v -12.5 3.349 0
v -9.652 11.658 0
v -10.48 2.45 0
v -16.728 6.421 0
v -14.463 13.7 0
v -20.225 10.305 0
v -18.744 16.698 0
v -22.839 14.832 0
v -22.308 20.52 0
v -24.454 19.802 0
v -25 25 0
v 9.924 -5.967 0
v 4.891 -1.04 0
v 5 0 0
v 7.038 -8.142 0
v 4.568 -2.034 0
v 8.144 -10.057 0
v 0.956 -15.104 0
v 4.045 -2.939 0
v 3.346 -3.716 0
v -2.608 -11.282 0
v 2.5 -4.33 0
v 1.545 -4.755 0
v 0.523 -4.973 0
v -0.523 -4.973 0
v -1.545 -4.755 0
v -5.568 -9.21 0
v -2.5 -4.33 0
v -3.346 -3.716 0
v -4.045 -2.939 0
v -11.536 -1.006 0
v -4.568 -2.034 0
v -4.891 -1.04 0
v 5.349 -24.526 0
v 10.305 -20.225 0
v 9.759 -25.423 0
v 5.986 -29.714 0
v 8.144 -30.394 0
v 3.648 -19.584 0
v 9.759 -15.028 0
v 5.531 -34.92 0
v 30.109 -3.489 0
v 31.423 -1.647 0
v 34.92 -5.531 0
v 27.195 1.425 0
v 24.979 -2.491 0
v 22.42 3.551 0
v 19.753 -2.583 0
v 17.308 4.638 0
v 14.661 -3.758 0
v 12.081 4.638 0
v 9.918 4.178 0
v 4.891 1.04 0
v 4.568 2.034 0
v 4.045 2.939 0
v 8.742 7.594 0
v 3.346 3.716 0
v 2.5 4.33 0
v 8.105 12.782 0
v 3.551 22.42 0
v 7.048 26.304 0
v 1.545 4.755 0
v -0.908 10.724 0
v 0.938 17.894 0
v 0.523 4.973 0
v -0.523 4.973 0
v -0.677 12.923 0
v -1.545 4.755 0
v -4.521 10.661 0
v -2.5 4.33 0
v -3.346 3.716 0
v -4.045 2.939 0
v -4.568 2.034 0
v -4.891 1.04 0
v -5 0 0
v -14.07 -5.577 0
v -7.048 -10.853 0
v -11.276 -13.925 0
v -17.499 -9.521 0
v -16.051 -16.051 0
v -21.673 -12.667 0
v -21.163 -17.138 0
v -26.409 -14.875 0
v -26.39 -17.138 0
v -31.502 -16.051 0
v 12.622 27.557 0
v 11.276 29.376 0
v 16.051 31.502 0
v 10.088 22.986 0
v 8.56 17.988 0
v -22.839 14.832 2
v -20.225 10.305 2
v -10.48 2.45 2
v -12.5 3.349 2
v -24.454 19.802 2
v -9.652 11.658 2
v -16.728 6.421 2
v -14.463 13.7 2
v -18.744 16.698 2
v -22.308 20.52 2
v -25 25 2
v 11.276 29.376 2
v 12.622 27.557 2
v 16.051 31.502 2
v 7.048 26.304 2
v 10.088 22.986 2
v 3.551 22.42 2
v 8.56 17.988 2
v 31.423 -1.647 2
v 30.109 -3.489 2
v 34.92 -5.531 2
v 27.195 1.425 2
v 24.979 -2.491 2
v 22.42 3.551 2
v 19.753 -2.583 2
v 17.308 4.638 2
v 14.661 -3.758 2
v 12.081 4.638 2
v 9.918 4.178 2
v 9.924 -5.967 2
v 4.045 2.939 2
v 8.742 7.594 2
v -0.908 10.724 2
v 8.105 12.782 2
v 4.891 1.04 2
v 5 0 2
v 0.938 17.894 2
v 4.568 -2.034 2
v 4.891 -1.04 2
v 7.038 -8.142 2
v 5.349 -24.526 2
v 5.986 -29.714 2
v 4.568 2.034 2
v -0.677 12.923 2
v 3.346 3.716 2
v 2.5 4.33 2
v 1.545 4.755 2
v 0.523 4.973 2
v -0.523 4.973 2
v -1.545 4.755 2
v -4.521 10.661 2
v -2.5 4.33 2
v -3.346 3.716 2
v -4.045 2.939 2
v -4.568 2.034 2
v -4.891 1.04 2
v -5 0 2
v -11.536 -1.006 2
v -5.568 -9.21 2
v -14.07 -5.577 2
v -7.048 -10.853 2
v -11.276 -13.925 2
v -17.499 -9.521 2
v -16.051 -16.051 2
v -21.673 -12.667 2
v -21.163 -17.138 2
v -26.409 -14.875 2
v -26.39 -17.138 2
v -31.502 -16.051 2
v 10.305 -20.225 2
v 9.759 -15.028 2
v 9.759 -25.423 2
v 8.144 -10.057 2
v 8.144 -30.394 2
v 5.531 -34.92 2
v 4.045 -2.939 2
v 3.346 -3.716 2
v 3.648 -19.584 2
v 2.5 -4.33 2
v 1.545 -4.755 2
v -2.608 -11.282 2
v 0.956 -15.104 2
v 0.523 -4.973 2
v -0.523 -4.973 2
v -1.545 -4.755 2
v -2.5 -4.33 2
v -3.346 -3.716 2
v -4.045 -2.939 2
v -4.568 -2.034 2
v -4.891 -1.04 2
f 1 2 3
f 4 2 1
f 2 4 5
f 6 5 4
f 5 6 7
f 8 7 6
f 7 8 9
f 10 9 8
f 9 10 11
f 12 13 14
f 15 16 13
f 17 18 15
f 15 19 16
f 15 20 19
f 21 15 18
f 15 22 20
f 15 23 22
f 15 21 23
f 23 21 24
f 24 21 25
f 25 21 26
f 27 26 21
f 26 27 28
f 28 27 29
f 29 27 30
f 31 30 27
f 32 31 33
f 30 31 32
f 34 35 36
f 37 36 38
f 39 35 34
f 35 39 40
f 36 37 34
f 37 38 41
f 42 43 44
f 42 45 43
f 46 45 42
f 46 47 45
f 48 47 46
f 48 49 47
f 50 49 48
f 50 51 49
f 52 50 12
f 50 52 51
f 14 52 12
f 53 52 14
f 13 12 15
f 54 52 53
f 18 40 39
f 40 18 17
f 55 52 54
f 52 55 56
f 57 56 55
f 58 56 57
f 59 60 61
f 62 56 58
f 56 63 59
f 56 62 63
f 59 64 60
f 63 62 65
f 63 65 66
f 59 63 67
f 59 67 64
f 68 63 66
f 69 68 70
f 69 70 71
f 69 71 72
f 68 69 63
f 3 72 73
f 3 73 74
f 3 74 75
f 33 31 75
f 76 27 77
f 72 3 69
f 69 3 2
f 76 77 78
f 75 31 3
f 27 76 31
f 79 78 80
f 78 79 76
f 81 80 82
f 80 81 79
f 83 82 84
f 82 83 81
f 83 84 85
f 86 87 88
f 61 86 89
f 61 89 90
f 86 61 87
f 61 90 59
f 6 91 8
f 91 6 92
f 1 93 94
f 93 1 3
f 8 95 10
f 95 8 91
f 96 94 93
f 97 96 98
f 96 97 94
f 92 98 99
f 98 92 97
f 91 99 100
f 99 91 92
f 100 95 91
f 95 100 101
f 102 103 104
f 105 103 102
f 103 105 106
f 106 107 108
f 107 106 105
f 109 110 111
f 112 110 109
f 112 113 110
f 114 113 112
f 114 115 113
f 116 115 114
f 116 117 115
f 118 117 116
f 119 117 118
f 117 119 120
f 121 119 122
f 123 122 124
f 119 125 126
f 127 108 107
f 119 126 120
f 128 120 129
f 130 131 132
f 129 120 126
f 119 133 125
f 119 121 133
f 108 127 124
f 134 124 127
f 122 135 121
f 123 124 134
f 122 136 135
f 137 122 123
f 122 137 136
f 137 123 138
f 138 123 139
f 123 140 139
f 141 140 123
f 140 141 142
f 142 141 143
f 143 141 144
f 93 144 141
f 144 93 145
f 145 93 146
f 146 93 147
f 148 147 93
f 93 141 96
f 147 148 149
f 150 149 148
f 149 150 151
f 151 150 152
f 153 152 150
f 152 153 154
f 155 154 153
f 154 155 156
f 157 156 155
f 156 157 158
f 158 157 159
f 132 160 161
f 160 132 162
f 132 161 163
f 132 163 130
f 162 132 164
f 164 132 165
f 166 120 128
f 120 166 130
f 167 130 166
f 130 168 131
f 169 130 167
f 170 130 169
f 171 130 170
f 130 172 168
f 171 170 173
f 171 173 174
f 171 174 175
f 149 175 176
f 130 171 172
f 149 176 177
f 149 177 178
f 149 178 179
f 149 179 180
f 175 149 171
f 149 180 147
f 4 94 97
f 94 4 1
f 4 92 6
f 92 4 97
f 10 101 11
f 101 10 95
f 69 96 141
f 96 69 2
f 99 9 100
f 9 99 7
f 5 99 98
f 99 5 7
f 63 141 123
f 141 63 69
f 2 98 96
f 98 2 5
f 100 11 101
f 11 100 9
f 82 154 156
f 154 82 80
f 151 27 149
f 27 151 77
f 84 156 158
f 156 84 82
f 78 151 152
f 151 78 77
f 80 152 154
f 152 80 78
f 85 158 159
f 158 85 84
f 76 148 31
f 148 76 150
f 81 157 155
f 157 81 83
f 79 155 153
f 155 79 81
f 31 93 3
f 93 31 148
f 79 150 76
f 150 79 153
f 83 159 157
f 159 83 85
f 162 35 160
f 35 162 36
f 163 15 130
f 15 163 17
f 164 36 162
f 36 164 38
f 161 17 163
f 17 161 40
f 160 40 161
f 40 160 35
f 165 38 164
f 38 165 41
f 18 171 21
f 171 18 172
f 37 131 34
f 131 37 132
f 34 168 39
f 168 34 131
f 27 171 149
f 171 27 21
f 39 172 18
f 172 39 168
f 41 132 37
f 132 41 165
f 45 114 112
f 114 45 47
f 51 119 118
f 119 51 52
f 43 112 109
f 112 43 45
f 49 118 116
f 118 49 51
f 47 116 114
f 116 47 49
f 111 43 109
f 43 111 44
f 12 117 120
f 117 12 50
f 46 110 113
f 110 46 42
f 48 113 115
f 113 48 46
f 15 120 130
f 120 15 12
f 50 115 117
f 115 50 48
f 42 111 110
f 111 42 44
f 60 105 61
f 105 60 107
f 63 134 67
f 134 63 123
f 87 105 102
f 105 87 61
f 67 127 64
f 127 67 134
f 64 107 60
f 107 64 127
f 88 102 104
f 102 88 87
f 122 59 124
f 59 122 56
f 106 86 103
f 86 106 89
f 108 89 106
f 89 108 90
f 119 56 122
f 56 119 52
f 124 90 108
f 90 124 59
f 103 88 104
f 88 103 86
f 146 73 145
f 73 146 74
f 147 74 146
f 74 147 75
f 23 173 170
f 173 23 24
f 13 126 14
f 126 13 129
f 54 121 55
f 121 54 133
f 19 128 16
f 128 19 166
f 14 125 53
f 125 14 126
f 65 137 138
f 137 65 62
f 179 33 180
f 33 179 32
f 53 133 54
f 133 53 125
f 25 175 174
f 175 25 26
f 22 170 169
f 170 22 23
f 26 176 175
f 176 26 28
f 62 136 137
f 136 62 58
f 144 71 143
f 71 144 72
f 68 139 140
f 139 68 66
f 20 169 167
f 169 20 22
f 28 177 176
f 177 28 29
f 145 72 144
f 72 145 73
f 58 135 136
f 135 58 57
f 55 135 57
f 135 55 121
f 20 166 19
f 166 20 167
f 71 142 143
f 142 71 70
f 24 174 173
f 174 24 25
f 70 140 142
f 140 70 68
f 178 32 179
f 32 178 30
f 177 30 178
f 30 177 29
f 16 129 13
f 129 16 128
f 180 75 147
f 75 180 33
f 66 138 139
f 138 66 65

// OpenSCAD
$fs=0.1;

module arm(r) {
  translate([-r,r,0]){
    difference(){
      translate([r,0,0]) cylinder(r=r, h=2);

      rotate([0,0,25]) translate([r,0,-.5])
        cylinder(r=r, h=3);
      
      translate([r,r,-.5]) rotate([0,0,270]) cube([r*2,r*2,3]);
    }
  }
}

difference() {
//  cylinder(d=50, h=2);
  for(v = [0:72:360]) {
    rotate([0,0,v]) arm(r=25);
  }
  translate([0,0,-1]) cylinder(d=10, h=5);
}

// vim: set ai et sw=2 ts=2 :
